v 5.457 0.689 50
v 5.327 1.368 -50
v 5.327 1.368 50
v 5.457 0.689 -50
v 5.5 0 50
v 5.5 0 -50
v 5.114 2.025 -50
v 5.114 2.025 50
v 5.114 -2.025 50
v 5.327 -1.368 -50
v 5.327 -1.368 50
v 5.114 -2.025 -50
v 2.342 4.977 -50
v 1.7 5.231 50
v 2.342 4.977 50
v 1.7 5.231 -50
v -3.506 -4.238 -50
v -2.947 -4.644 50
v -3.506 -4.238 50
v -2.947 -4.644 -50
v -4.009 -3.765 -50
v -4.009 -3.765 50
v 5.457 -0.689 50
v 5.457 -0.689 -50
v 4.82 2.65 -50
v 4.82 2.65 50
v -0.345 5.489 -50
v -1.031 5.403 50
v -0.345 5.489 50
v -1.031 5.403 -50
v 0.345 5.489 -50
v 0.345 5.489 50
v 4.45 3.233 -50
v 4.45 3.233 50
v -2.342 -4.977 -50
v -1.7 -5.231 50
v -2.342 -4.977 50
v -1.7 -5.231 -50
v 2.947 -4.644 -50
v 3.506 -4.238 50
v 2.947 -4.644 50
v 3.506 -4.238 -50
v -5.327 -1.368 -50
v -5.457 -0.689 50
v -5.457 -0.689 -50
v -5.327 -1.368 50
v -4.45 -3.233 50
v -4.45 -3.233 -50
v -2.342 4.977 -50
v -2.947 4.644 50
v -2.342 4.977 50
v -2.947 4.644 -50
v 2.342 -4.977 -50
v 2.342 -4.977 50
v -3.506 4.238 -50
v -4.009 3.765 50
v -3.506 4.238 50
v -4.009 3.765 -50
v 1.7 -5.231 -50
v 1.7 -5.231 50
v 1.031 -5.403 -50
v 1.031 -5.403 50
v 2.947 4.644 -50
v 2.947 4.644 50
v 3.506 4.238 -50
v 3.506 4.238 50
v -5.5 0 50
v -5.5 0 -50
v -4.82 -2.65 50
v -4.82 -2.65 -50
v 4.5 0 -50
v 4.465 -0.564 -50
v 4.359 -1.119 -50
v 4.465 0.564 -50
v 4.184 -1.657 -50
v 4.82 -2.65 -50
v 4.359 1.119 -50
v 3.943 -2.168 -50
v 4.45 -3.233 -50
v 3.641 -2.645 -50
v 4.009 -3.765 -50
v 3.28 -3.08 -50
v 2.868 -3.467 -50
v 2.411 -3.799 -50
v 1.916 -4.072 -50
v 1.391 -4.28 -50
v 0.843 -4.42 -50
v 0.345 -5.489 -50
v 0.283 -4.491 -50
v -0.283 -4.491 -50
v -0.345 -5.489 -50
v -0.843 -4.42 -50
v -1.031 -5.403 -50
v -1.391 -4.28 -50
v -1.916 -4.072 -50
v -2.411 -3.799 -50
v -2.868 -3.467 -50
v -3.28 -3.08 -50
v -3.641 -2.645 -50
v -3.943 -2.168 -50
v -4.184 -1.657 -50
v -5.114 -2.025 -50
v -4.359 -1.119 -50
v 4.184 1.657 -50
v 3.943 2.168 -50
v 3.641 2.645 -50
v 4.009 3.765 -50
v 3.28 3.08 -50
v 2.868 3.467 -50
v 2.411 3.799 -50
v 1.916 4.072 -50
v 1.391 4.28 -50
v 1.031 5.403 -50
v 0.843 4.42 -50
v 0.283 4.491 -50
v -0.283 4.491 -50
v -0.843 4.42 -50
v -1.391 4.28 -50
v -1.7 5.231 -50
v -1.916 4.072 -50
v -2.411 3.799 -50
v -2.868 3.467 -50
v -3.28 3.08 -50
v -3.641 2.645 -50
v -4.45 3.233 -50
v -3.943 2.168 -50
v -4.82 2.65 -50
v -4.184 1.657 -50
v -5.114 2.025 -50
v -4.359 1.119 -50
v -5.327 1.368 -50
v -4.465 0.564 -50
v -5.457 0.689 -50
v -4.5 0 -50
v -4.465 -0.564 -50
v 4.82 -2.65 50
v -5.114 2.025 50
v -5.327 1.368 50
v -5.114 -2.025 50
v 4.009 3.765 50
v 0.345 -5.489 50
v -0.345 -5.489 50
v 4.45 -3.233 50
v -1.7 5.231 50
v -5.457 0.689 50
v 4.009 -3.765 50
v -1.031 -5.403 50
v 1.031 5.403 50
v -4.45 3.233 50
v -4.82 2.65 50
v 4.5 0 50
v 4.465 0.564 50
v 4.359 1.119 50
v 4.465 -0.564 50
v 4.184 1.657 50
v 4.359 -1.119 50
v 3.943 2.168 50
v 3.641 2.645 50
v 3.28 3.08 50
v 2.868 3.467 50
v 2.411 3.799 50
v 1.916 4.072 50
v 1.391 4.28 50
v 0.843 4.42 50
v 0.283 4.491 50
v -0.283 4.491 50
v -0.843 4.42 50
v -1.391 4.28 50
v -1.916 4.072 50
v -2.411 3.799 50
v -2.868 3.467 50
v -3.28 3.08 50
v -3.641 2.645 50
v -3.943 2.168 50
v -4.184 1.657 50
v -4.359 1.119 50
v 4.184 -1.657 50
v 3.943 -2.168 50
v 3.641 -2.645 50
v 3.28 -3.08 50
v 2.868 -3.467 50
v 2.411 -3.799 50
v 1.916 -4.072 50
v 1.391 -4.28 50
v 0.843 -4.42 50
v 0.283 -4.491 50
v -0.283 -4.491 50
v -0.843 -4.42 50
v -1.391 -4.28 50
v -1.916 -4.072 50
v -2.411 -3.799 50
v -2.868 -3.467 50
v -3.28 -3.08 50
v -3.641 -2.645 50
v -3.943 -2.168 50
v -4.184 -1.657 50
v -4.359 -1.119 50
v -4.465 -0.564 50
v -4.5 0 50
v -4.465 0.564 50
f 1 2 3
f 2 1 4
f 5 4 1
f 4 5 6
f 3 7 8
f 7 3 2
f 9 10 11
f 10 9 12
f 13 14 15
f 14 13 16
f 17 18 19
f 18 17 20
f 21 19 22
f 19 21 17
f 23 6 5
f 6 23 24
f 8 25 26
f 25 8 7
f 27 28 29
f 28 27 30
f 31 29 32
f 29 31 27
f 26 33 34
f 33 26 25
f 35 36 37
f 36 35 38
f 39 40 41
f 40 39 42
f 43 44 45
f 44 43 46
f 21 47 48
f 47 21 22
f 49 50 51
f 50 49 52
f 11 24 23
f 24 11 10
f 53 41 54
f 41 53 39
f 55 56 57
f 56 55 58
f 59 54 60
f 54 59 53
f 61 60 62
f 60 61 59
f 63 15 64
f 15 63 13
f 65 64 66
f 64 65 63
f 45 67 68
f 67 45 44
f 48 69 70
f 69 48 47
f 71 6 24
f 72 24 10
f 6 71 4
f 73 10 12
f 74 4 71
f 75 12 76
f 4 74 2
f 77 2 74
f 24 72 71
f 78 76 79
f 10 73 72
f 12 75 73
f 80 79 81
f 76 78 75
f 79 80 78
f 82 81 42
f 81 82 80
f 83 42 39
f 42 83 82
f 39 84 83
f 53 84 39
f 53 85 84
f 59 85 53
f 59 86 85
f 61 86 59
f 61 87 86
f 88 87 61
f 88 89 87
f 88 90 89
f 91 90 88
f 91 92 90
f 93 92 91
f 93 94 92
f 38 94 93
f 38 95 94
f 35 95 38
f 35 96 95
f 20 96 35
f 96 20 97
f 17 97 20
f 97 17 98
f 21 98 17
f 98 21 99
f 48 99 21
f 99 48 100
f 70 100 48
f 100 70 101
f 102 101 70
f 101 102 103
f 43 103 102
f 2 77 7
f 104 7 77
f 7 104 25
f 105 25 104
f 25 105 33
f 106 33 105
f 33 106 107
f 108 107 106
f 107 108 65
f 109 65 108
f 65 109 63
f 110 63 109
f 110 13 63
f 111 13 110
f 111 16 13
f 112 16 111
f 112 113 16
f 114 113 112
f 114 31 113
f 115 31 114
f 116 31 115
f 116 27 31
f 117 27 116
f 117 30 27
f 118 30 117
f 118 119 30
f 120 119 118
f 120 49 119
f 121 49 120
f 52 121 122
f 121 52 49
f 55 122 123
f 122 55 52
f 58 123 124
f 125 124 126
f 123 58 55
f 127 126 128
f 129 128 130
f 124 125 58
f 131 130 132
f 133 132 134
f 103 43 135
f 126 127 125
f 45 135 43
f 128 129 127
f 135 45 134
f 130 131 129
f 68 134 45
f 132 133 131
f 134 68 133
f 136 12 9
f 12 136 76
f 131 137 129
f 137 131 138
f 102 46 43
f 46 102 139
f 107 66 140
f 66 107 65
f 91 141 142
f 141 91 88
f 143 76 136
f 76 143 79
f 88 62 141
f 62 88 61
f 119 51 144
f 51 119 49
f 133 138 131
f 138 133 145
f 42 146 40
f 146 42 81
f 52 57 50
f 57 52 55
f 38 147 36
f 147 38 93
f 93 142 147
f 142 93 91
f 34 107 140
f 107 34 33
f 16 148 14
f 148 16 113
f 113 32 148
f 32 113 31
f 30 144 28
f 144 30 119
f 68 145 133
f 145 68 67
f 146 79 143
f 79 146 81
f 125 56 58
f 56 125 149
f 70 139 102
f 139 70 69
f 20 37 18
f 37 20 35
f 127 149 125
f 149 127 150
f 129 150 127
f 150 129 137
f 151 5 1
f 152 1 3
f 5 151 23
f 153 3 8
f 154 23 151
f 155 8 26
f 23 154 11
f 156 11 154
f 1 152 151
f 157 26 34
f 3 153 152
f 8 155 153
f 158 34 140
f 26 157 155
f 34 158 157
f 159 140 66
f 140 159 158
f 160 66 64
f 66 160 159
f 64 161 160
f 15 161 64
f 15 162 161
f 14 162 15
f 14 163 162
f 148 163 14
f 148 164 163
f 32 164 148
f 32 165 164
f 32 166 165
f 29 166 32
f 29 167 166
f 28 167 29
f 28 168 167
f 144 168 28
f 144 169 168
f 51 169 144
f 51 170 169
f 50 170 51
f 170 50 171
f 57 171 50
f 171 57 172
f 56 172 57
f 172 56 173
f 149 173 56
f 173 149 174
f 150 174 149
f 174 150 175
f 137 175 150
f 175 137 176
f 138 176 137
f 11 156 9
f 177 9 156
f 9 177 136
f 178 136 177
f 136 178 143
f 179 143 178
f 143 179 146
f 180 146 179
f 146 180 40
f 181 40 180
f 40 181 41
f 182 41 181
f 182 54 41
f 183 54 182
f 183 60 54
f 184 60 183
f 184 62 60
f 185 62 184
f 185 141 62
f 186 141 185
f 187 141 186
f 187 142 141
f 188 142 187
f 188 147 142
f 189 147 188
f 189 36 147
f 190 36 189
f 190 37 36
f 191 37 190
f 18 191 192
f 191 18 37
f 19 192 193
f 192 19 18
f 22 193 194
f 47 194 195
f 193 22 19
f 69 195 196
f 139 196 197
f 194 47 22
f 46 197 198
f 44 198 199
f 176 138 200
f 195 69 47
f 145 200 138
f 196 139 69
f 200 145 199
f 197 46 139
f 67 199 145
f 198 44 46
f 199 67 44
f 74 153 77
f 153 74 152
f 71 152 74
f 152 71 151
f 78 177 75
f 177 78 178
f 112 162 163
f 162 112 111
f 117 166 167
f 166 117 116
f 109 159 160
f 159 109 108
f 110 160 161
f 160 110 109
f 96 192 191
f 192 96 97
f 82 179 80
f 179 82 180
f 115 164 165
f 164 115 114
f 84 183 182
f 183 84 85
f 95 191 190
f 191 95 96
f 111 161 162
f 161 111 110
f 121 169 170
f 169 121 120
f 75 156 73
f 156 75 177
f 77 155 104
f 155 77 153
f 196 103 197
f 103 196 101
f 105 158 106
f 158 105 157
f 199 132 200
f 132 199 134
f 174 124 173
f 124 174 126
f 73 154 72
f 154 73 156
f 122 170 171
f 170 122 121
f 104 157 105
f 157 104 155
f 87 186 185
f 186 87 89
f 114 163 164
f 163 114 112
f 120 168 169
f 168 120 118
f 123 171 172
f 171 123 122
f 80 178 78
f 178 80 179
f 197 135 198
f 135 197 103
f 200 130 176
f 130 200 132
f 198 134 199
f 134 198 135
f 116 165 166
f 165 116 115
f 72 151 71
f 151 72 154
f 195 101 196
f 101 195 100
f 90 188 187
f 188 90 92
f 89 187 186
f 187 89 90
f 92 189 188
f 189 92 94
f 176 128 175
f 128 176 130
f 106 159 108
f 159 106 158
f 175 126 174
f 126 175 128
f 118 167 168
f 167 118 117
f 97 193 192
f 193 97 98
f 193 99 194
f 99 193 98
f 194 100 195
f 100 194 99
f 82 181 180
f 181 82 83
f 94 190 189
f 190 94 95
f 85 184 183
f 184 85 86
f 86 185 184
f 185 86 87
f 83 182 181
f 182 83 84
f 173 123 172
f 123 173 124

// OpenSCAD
$fn = 50;


difference() {
	union() {
		translate(v = [0, 0, -50.0000000000]) {
			cylinder(h = 100, r = 5.5000000000);
		}
	}
	union() {
		translate(v = [0, 0, -100.0000000000]) {
			cylinder(h = 200, r = 4.5000000000);
		}
	}
}
